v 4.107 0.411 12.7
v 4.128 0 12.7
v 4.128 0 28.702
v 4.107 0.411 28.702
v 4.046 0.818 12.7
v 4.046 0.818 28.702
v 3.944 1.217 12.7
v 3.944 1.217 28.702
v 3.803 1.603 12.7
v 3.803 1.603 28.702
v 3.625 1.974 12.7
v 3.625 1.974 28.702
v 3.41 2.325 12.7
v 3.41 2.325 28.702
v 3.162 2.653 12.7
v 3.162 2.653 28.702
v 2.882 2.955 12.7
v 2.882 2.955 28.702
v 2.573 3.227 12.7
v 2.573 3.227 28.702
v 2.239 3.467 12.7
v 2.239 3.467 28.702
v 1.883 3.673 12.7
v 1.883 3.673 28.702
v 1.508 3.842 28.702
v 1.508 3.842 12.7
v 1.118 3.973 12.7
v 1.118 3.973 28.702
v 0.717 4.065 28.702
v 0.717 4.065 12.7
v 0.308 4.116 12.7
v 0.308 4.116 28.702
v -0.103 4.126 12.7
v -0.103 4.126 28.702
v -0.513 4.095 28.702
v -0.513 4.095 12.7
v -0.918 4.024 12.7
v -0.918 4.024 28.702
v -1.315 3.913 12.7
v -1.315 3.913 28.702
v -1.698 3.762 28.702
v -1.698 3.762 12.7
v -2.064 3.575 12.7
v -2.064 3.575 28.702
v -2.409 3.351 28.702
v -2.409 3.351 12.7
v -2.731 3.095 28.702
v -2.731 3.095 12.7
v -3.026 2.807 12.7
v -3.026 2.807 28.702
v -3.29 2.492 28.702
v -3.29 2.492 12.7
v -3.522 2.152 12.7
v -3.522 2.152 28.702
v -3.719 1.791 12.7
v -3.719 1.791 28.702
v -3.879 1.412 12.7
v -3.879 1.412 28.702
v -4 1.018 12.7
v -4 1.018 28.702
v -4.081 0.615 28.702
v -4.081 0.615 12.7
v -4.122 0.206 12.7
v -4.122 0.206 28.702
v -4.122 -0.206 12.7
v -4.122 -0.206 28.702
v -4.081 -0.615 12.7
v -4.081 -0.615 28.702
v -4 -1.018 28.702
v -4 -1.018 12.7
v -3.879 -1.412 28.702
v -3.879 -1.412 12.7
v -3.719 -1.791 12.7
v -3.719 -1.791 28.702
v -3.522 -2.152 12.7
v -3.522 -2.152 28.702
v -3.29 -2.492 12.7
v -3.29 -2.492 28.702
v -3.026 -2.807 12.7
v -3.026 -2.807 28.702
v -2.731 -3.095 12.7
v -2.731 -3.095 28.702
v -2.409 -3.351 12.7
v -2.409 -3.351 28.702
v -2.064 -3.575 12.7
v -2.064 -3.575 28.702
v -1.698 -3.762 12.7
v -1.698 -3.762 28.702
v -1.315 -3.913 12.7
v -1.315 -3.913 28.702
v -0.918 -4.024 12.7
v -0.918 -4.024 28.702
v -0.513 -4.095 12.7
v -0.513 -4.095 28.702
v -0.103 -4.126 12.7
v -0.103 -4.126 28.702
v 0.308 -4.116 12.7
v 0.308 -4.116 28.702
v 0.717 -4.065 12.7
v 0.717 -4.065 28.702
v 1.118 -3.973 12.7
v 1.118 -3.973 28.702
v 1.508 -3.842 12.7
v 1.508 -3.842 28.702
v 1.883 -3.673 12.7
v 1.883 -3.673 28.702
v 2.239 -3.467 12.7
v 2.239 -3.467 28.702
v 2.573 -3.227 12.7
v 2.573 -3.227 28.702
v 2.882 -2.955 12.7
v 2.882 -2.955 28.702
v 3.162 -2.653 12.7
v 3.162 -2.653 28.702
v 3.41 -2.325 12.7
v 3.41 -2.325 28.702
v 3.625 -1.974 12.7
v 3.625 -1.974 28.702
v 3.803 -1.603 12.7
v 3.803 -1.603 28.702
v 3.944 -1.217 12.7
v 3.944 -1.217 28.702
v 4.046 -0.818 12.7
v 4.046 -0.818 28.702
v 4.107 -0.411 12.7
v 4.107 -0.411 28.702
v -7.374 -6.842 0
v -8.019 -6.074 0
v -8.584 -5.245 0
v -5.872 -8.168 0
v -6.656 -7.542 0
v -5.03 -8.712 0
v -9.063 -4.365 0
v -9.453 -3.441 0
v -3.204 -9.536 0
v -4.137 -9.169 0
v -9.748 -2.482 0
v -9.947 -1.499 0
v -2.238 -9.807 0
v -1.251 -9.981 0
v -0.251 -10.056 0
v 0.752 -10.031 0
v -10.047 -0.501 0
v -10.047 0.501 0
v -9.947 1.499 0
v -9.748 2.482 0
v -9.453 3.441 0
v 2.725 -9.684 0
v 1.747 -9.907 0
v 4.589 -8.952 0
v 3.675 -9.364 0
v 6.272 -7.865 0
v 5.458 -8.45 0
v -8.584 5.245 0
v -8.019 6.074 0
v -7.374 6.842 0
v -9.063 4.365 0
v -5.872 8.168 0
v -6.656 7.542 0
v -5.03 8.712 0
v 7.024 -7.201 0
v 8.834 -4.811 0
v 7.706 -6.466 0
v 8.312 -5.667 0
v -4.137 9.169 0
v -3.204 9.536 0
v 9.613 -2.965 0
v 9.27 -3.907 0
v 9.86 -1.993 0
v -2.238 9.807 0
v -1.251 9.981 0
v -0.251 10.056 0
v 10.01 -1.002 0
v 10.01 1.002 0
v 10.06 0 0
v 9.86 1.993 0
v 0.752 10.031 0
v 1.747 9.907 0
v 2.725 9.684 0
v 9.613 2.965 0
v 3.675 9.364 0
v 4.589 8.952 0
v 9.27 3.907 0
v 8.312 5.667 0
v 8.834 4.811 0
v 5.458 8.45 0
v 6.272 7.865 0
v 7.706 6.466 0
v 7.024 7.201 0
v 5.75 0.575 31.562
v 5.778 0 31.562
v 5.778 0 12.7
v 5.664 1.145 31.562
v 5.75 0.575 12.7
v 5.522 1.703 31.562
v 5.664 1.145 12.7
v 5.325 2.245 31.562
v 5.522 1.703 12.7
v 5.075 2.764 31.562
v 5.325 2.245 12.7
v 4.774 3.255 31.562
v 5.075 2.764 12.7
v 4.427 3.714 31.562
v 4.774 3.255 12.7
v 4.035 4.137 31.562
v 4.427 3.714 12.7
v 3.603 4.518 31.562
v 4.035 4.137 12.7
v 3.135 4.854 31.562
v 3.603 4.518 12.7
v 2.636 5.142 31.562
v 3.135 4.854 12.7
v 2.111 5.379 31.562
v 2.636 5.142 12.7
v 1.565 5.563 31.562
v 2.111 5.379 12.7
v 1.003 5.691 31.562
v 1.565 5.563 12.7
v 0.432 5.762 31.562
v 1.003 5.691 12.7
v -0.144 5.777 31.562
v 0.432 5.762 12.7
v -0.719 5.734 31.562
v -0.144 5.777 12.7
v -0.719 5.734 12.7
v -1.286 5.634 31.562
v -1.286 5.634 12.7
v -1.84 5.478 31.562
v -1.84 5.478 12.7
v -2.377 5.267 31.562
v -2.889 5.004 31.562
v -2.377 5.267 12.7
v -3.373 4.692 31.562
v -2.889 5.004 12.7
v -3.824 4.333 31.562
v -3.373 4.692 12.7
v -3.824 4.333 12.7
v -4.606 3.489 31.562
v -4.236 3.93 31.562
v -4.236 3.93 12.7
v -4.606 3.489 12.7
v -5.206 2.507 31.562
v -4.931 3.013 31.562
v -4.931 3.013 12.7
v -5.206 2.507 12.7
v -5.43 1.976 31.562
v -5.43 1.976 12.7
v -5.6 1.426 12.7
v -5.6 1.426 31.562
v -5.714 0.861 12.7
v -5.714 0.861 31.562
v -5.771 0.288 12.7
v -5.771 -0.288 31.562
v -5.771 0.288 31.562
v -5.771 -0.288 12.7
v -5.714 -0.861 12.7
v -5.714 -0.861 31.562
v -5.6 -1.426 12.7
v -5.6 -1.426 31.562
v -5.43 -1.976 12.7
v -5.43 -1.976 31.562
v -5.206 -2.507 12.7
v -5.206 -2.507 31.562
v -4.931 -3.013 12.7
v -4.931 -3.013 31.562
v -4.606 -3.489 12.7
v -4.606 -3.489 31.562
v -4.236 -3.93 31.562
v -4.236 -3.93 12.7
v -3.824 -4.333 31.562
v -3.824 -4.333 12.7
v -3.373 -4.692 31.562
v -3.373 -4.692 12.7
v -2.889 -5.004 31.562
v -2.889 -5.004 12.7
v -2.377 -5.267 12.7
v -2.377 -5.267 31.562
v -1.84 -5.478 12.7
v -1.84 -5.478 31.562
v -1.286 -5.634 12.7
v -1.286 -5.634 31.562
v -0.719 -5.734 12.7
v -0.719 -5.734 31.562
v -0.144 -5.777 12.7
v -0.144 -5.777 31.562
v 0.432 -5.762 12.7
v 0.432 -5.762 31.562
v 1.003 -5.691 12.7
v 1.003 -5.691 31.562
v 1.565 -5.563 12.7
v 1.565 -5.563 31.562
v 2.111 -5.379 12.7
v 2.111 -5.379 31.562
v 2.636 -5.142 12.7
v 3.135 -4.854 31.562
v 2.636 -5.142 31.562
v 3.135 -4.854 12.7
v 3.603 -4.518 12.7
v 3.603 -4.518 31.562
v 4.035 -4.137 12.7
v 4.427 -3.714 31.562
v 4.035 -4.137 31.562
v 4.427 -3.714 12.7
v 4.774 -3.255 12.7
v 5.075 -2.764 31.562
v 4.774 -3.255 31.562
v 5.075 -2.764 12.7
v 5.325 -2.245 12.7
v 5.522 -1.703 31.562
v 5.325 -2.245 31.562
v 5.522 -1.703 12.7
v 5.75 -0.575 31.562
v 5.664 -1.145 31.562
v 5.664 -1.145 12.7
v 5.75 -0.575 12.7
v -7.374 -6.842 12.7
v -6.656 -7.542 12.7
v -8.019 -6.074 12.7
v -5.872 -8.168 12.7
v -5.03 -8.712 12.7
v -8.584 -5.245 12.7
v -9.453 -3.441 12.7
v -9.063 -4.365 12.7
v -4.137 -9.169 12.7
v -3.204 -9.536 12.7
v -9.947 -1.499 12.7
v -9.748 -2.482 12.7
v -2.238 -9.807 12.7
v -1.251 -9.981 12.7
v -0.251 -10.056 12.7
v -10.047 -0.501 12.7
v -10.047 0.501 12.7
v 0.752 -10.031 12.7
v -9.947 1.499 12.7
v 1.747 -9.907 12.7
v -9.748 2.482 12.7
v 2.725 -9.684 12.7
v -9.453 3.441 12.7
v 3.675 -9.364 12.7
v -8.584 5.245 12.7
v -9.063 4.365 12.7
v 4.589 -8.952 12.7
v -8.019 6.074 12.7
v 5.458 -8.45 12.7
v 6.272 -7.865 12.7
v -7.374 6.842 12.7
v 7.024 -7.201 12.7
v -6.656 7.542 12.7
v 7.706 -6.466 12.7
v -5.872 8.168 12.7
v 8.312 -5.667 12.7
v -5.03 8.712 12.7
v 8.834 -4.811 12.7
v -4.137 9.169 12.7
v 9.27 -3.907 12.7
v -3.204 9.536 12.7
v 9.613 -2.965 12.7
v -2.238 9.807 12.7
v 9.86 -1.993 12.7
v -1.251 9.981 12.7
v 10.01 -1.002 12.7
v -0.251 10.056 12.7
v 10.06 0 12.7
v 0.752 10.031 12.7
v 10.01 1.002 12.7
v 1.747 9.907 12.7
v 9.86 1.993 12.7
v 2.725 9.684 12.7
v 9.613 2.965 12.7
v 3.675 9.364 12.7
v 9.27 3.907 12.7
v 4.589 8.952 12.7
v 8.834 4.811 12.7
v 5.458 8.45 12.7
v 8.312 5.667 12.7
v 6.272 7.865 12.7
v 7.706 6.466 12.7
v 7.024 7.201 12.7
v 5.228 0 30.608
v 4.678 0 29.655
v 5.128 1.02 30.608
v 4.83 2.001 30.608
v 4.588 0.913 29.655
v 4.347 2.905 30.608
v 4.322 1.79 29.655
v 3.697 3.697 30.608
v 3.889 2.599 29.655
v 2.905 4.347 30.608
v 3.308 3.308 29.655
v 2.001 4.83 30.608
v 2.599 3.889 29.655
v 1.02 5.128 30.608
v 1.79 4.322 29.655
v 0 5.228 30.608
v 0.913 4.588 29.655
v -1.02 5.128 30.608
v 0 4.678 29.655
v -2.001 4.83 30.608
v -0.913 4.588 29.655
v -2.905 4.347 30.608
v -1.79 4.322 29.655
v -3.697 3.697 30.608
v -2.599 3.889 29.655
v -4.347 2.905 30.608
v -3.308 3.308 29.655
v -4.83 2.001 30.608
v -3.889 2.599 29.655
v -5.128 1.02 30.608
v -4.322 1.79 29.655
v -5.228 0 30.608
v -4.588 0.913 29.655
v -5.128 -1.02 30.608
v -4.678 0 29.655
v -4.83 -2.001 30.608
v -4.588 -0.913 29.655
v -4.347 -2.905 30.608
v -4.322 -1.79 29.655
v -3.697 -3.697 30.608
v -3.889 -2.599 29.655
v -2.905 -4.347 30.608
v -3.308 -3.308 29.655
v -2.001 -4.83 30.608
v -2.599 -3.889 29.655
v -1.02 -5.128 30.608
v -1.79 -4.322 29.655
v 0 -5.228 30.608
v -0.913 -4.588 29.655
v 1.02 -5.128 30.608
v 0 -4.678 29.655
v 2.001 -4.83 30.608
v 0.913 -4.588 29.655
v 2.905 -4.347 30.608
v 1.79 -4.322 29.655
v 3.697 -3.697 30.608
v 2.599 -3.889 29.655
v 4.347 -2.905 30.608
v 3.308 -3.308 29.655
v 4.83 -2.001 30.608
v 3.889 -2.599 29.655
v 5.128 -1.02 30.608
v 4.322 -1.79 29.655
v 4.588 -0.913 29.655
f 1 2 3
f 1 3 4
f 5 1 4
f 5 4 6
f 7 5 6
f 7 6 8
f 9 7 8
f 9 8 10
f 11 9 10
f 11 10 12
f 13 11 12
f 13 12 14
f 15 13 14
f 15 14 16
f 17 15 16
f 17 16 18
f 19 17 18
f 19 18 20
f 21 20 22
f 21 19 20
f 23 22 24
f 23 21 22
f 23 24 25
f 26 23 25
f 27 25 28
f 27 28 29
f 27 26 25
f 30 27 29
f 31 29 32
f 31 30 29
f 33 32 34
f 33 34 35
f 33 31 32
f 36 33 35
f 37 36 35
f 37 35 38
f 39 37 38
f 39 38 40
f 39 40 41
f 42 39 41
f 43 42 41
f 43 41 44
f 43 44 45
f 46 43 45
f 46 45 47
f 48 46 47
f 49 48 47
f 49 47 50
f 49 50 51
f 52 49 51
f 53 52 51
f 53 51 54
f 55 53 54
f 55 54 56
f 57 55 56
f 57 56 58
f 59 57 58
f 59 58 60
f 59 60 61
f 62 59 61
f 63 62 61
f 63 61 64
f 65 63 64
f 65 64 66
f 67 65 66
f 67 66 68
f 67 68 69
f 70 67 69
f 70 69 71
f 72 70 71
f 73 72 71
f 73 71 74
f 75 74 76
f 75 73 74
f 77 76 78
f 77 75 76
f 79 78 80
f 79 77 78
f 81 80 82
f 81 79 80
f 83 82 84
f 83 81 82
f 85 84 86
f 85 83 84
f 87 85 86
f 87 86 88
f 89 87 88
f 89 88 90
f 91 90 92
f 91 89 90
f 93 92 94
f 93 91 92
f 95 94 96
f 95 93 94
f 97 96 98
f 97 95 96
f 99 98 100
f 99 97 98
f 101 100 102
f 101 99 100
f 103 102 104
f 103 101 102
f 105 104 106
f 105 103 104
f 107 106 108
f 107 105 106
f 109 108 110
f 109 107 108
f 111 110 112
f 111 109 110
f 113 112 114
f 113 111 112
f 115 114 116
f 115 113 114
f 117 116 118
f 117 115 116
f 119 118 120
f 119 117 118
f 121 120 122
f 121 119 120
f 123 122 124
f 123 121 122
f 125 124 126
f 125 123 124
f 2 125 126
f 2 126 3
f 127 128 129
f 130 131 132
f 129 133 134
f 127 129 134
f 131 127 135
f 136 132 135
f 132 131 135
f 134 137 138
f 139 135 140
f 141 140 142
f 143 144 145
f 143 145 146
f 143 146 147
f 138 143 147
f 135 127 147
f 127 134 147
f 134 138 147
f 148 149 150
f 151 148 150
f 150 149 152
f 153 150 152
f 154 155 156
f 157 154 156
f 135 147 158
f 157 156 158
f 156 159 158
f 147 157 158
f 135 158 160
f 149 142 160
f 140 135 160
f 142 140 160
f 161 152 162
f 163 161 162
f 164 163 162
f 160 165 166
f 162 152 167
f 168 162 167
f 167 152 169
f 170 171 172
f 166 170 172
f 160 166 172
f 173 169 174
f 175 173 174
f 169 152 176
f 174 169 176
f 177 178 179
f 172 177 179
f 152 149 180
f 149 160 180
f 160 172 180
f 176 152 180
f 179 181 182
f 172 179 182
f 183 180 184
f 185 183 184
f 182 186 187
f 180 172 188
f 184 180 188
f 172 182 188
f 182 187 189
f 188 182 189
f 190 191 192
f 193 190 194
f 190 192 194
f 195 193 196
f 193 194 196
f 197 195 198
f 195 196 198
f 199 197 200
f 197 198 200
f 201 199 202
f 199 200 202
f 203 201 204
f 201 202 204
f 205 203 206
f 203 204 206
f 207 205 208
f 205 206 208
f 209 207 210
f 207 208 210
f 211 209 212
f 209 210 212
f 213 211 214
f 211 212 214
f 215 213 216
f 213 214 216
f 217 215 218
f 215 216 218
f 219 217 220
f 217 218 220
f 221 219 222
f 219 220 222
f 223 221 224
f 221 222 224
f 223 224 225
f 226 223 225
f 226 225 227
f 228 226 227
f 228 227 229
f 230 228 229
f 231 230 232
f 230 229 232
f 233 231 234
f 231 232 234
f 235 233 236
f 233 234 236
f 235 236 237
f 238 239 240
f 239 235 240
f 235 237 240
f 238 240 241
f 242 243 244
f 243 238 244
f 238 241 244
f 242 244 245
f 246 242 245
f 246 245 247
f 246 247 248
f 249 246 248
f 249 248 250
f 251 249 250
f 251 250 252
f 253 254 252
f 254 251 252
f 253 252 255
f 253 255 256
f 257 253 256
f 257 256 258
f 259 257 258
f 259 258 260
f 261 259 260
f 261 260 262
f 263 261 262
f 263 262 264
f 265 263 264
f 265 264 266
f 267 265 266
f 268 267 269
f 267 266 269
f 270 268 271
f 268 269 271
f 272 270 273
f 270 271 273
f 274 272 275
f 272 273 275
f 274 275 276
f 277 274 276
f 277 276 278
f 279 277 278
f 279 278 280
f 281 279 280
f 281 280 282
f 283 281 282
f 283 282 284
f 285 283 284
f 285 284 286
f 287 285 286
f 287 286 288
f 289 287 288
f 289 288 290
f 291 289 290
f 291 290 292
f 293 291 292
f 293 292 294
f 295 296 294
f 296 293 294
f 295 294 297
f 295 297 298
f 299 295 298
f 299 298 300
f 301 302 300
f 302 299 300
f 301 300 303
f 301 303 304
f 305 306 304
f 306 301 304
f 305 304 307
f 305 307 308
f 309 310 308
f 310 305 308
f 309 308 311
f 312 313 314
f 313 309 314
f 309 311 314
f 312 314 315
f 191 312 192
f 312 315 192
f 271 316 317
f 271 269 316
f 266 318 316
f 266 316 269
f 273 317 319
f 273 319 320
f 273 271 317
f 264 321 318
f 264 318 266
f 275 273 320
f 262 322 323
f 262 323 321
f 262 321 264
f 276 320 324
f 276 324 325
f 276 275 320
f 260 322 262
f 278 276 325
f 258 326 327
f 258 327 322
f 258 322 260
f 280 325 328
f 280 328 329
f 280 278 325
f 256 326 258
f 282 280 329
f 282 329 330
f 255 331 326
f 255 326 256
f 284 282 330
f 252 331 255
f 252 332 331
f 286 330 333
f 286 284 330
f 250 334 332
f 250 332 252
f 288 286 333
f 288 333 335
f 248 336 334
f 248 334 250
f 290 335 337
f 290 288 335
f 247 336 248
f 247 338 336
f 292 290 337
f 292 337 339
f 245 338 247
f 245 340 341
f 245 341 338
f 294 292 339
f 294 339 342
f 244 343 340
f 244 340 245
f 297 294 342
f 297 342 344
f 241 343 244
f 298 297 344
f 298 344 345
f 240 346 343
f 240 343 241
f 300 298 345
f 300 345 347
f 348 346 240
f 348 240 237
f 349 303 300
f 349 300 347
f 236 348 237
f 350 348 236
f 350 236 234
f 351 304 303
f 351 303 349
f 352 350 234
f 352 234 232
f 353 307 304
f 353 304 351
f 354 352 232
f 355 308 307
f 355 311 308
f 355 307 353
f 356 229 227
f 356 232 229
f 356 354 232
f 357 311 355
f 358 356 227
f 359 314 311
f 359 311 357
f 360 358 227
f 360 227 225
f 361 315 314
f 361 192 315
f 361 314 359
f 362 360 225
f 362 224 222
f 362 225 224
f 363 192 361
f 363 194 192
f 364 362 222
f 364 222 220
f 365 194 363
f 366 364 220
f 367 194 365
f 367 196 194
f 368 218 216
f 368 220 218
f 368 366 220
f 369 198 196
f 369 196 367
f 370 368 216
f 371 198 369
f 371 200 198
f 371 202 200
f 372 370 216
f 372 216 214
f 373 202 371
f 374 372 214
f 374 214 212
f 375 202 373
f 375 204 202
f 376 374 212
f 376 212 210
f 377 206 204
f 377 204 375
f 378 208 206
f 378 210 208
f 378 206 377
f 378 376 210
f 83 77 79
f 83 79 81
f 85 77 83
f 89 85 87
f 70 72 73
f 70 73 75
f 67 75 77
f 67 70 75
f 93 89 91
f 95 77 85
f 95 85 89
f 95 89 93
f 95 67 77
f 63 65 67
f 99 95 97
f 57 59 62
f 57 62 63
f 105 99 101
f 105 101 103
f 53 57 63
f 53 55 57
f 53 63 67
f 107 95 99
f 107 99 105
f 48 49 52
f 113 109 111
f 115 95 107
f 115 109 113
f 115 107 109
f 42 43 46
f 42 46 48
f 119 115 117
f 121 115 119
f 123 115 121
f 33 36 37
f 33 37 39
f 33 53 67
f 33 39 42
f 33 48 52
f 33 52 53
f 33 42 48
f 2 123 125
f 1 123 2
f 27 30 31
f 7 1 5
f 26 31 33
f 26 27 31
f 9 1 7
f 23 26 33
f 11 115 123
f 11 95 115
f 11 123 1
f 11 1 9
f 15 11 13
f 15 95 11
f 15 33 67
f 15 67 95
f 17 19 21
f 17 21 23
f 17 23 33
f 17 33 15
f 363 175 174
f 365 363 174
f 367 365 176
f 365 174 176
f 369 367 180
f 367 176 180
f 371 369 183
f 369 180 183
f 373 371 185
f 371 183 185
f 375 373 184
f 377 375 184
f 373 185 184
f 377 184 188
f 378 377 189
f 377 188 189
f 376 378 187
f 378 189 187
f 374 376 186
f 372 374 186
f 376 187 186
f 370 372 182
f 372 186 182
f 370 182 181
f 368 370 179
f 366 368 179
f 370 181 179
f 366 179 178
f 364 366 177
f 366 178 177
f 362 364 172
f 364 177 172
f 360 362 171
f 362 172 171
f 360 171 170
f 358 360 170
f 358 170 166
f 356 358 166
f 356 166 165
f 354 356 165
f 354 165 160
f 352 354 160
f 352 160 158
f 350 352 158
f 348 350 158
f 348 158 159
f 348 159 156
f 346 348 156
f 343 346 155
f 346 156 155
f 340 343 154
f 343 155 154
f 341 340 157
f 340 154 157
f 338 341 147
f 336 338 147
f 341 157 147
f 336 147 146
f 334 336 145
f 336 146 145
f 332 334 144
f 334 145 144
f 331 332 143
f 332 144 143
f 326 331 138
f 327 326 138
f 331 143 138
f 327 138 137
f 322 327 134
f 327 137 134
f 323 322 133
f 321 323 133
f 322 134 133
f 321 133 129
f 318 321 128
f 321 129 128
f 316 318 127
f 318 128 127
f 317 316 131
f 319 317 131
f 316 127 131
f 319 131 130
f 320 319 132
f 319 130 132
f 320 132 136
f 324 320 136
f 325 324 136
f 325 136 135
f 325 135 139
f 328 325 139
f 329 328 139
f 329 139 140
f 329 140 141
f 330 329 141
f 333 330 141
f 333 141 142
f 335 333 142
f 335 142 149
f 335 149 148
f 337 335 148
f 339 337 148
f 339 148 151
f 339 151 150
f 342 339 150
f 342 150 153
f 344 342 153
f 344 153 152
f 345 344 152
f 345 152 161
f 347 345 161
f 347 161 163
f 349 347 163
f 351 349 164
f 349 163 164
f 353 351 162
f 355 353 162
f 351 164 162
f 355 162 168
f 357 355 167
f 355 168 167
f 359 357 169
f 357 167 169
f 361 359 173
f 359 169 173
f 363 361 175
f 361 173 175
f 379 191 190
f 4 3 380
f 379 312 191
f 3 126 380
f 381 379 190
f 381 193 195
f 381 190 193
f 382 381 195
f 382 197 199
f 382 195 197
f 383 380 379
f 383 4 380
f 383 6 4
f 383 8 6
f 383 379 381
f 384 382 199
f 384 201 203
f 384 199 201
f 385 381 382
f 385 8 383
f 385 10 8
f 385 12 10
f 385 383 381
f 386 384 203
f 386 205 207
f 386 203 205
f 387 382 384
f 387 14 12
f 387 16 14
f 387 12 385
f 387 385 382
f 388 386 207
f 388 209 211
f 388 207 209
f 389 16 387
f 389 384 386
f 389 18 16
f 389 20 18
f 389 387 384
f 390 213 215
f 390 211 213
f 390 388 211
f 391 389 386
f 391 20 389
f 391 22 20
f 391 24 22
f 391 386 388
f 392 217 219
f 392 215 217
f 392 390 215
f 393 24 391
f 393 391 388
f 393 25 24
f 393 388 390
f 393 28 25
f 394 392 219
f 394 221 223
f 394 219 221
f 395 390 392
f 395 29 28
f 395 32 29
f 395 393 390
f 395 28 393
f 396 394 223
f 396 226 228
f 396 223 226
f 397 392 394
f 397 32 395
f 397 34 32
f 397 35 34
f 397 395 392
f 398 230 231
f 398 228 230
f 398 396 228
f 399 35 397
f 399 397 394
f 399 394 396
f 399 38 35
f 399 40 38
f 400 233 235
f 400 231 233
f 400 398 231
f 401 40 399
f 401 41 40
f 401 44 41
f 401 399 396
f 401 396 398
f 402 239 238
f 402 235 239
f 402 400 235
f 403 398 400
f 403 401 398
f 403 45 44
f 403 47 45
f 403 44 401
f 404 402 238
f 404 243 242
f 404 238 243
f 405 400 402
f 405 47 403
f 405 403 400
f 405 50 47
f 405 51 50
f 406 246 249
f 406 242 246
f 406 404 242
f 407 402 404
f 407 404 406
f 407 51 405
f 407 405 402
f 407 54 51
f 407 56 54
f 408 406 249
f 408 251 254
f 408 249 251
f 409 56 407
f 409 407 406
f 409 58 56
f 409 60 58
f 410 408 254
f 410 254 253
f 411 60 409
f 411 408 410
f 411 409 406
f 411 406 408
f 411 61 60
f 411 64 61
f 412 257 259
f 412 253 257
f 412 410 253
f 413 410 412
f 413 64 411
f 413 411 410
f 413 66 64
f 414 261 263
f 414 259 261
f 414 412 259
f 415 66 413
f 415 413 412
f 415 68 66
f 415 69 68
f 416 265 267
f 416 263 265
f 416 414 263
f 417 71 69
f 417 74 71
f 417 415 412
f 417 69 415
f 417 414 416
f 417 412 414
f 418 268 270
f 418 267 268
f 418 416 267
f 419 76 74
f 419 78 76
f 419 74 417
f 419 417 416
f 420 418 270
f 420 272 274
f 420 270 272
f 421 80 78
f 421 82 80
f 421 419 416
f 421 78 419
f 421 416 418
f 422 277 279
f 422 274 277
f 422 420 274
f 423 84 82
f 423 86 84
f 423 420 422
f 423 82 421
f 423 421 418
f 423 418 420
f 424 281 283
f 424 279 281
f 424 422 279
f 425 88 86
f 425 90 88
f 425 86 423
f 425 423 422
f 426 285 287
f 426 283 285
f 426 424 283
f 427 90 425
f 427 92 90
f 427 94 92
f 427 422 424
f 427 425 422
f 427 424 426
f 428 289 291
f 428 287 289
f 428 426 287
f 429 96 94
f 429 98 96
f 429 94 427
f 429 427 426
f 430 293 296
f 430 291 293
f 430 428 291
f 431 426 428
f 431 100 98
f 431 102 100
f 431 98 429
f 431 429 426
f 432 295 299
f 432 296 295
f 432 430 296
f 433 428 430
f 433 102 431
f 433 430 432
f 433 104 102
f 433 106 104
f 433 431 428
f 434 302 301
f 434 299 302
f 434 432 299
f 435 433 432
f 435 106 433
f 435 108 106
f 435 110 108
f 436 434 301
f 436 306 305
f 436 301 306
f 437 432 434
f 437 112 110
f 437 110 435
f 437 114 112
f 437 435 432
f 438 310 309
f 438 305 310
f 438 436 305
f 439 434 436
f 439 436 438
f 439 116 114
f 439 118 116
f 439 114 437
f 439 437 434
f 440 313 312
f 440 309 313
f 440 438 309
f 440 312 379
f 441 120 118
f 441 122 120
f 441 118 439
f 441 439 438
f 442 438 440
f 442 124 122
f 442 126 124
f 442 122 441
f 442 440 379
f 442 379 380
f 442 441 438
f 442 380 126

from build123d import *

# Parameters (mm, degrees)
F0_R     = 10.0595284502
F1_DEPTH = 12.7
F2_R     = 5.7785
F2_R_2   = 4.1275
F3_DEPTH = 19.05


# Not quite as in the source:
# - a fillet or chamfer that OpenCascade refuses, or shapes differently, is made with other operations: its cross-section is extruded or revolved along the edge and cut away or added


with BuildPart() as f1:
    # F0 (on Top) → F1 (new body)
    with BuildSketch(Plane.XY):
        Circle(F0_R)
    extrude(amount=F1_DEPTH)

    # F2 (on face) → F3 (join)
    with BuildSketch(Plane.XY.offset(12.7)):
        Circle(F2_R)
        Circle(F2_R_2, mode=Mode.SUBTRACT)
    extrude(amount=F3_DEPTH)

    # F4: chamfer of 3.048 x 1.7597636205 on 1 edges, made by hand

    # F4_s1 → F4_t2 (revolve, cut)
    with BuildSketch(Plane.XZ):
        Polygon((5.8872636205, 31.75), (4.1275, 28.702), (4.1275, 31.75), align=None)
    revolve(axis=Axis((0, 0, 31.75), (0, 0, 1)), mode=Mode.SUBTRACT)


solid = f1.part
